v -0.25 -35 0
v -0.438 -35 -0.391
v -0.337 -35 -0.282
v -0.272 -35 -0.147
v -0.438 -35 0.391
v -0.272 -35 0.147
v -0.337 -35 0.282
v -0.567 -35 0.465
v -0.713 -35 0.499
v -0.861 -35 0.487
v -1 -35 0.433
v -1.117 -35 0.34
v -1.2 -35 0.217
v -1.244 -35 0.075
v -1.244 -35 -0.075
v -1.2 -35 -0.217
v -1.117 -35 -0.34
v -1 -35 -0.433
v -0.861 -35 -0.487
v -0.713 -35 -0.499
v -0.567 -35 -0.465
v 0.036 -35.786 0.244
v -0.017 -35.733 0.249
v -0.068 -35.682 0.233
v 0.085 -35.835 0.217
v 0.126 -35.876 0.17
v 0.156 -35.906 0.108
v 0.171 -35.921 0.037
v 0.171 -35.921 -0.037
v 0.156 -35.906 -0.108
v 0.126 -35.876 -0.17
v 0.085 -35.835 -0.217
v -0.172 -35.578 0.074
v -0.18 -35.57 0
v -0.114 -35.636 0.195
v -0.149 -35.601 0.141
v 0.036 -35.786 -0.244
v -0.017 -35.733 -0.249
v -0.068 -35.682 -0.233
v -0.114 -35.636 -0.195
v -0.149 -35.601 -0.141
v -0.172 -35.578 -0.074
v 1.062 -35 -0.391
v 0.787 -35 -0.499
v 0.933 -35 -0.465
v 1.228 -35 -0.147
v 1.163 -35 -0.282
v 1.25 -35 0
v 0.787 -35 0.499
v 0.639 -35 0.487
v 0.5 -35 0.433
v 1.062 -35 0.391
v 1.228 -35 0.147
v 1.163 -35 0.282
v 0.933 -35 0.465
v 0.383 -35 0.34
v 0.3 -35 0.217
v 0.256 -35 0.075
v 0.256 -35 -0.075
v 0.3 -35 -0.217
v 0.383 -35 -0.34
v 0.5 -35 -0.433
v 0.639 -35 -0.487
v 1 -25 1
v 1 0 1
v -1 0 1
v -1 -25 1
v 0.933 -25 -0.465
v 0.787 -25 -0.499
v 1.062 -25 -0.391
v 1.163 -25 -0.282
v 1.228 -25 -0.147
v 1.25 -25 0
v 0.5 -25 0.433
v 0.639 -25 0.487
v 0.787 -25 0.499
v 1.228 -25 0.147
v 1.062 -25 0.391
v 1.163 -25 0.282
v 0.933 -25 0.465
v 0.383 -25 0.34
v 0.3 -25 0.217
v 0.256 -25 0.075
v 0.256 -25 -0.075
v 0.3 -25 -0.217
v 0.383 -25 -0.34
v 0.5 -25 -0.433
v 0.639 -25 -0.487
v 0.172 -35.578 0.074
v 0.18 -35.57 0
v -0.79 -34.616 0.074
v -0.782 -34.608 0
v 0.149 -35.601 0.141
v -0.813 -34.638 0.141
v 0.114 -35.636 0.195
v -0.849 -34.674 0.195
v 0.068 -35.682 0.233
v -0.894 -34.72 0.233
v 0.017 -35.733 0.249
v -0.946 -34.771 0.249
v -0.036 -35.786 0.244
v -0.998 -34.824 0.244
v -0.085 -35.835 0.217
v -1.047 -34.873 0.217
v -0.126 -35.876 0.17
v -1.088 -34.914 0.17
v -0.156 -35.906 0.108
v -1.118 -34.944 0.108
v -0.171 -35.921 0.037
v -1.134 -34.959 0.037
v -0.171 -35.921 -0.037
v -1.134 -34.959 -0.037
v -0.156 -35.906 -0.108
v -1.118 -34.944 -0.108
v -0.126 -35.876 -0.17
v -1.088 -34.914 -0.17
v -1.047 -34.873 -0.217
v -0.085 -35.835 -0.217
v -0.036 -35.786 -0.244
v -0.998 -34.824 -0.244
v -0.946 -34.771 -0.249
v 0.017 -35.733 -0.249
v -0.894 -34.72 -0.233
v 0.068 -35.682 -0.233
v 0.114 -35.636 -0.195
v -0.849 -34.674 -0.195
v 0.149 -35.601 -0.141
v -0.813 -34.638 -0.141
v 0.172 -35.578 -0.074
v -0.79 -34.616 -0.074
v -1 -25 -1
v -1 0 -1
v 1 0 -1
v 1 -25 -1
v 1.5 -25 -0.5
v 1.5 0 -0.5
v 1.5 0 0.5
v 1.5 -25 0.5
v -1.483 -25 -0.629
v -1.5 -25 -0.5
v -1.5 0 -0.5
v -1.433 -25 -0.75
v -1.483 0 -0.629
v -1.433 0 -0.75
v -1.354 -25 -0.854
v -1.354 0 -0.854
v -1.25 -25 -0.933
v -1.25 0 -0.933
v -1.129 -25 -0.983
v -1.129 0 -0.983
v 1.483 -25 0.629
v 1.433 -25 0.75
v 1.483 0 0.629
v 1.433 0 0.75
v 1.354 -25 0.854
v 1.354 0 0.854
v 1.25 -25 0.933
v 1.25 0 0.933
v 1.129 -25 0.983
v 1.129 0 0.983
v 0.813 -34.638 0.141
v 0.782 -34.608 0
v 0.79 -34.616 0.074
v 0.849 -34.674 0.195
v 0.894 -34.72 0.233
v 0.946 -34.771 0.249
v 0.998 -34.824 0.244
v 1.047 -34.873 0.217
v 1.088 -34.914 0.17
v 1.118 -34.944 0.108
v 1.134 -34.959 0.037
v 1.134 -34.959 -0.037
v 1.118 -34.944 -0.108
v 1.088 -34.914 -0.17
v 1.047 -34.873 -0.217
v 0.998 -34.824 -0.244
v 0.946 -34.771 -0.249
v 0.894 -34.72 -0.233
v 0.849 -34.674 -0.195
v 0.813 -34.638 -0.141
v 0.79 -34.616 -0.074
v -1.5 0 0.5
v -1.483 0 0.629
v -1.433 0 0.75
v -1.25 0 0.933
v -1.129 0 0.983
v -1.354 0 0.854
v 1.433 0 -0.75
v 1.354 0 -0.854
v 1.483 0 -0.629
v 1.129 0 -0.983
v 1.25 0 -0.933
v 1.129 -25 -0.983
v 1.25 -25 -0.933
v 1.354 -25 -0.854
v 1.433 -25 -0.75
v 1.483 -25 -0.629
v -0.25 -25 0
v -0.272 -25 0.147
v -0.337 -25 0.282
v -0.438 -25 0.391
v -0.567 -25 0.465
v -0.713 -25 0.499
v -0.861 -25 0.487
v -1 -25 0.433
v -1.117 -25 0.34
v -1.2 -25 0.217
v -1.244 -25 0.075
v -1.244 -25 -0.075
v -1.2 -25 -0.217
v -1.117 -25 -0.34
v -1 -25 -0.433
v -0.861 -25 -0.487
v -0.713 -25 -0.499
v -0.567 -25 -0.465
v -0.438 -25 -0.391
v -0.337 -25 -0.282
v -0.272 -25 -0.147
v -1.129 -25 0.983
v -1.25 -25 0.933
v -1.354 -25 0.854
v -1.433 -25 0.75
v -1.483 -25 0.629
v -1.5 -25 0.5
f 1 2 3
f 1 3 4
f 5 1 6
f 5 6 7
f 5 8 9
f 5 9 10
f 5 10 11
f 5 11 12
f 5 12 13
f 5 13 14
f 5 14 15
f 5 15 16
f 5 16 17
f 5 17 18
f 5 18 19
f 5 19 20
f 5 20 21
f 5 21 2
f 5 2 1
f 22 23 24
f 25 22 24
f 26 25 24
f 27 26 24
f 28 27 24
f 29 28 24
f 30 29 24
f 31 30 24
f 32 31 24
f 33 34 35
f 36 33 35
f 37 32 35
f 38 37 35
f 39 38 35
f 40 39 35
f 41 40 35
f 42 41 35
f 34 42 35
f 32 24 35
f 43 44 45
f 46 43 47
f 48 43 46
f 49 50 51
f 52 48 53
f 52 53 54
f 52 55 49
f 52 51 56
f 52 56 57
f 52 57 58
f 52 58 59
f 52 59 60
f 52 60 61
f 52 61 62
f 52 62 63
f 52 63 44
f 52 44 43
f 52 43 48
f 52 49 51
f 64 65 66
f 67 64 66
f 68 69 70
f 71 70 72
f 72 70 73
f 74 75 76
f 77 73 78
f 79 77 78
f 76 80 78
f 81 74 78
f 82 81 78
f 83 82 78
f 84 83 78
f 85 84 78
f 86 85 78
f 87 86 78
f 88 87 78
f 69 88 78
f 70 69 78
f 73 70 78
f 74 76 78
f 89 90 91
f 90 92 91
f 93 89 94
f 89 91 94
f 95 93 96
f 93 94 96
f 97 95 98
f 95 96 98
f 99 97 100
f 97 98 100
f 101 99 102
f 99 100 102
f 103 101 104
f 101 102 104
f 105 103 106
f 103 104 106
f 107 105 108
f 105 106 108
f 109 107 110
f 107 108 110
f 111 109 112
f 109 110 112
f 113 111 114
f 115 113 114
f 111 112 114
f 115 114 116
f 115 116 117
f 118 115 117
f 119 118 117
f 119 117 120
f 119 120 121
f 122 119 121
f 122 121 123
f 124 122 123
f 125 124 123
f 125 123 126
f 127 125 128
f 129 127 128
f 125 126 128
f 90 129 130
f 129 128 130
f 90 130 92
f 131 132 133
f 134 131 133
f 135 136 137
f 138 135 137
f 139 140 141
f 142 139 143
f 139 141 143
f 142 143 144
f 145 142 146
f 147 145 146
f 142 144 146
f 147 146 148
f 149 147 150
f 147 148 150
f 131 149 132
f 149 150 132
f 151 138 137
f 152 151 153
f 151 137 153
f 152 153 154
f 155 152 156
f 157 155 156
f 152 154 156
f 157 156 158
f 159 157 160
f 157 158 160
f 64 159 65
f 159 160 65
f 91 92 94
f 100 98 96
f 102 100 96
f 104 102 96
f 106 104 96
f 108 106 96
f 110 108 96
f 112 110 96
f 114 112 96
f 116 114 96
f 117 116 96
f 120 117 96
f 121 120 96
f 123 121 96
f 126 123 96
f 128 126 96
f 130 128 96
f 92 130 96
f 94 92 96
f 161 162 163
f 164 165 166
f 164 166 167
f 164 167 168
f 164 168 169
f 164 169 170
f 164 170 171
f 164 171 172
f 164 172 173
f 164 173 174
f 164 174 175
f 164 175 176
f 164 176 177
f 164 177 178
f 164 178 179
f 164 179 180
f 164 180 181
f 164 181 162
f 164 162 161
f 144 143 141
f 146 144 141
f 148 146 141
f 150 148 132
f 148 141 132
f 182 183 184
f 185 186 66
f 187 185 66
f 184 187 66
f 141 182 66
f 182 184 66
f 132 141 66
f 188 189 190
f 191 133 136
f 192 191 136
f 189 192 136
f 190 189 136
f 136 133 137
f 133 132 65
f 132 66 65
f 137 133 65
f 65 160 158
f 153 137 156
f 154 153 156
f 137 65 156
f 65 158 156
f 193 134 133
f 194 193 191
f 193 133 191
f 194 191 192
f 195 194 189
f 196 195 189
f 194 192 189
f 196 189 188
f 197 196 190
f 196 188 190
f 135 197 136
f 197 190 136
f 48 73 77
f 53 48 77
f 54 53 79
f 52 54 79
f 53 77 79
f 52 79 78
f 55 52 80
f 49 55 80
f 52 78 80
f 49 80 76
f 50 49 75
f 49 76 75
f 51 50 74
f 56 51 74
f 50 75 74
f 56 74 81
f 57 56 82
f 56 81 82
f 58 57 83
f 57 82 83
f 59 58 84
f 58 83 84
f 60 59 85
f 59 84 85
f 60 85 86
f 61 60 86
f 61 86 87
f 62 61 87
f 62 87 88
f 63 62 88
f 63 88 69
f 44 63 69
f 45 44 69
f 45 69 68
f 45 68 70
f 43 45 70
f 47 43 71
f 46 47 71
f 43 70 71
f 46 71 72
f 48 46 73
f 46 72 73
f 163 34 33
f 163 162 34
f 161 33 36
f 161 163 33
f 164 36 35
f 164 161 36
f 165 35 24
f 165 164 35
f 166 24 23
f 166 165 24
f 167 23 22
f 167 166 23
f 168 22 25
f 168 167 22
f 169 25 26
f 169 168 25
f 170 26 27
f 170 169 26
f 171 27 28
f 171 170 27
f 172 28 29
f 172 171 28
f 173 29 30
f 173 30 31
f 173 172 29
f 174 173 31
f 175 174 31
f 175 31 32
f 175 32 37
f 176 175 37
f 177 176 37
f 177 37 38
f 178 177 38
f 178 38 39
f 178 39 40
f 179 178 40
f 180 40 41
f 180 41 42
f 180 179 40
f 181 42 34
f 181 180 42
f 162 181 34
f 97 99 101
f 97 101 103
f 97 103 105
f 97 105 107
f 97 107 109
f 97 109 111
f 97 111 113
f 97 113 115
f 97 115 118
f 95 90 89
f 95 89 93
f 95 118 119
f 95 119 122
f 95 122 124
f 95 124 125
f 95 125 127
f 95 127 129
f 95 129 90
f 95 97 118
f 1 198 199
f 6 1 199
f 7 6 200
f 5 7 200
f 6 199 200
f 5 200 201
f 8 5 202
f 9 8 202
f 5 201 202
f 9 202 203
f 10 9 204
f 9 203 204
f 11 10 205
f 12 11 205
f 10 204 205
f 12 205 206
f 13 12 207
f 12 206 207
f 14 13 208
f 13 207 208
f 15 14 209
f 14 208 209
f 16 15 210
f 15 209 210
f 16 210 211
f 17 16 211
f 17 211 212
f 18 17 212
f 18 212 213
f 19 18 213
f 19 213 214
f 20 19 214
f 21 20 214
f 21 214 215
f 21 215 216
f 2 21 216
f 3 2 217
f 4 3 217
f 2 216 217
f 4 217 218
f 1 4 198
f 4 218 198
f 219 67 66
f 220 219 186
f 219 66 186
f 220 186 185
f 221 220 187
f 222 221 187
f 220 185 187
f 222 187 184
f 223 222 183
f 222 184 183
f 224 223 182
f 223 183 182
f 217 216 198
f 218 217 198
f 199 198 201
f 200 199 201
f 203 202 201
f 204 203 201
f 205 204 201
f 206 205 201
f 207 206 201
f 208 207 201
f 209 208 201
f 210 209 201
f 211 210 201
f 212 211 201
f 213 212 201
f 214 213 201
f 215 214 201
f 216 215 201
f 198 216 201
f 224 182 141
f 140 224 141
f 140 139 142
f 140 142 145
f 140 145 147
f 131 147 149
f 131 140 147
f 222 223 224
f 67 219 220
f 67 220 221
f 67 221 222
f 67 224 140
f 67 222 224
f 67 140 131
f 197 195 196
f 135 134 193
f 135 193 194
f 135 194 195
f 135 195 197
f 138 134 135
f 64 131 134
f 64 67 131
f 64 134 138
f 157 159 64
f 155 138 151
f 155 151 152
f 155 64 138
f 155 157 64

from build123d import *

# Parameters (mm, degrees)
F1_DEPTH      = 25
F2_R          = 0.5
F3_DEPTH      = 10
F6_R          = 0.25
F7_DEPTH      = 0.3
F7_DEPTH_BACK = 1.0606601718


# Not quite as in the source:
# - the program builds the solid bodies; features that only make, move or delete a surface that nothing else refers to are left out


with BuildPart() as f1:
    # F0 (on Front) → F1 (new body)
    with BuildSketch(Plane.XZ):
        with BuildLine():
            Line((-1, -1), (1, -1))
            ThreePointArc((1, -1), (1.3535533906, -0.8535533906), (1.5, -0.5))
            Line((1.5, -0.5), (1.5, 0.5))
            ThreePointArc((1.5, 0.5), (1.3535533906, 0.8535533906), (1, 1))
            Line((1, 1), (-1, 1))
            ThreePointArc((-1, 1), (-1.3535533906, 0.8535533906), (-1.5, 0.5))
            Line((-1.5, 0.5), (-1.5, -0.5))
            ThreePointArc((-1.5, -0.5), (-1.3535533906, -0.8535533906), (-1, -1))
        make_face()
    extrude(amount=F1_DEPTH)


with BuildPart() as f3:
    # F2 (on face) → F3 (new body)
    with BuildSketch(Plane.XZ.offset(25)):
        with Locations((-0.75, 0)):
            Circle(F2_R)
    extrude(amount=F3_DEPTH)


with BuildPart() as f3b:
    # F2 (on face) → F3, piece 2 (new body)
    with BuildSketch(Plane.XZ.offset(25)):
        with Locations((0.75, 0)):
            Circle(F2_R)
    extrude(amount=F3_DEPTH)


with BuildPart() as f7:
    # F6 (on face) → F7 (new body, two sides)
    with BuildSketch(Plane(origin=(-17.125, -17.125, 0), x_dir=(-0.7071067812, 0.7071067812, 0), z_dir=(0.7071067812, 0.7071067812, 0))) as f7_sk:
        with Locations((-25.2743531018, 0)):
            Circle(F6_R)
    extrude(amount=F7_DEPTH)
    extrude(f7_sk.sketch, amount=-F7_DEPTH_BACK)


with BuildPart() as f8_1:
    # F8: instance of F7
    add(f7.part.mirror(Plane.YZ))


solid = Compound([f1.part, f3.part, f3b.part, f7.part, f8_1.part])
